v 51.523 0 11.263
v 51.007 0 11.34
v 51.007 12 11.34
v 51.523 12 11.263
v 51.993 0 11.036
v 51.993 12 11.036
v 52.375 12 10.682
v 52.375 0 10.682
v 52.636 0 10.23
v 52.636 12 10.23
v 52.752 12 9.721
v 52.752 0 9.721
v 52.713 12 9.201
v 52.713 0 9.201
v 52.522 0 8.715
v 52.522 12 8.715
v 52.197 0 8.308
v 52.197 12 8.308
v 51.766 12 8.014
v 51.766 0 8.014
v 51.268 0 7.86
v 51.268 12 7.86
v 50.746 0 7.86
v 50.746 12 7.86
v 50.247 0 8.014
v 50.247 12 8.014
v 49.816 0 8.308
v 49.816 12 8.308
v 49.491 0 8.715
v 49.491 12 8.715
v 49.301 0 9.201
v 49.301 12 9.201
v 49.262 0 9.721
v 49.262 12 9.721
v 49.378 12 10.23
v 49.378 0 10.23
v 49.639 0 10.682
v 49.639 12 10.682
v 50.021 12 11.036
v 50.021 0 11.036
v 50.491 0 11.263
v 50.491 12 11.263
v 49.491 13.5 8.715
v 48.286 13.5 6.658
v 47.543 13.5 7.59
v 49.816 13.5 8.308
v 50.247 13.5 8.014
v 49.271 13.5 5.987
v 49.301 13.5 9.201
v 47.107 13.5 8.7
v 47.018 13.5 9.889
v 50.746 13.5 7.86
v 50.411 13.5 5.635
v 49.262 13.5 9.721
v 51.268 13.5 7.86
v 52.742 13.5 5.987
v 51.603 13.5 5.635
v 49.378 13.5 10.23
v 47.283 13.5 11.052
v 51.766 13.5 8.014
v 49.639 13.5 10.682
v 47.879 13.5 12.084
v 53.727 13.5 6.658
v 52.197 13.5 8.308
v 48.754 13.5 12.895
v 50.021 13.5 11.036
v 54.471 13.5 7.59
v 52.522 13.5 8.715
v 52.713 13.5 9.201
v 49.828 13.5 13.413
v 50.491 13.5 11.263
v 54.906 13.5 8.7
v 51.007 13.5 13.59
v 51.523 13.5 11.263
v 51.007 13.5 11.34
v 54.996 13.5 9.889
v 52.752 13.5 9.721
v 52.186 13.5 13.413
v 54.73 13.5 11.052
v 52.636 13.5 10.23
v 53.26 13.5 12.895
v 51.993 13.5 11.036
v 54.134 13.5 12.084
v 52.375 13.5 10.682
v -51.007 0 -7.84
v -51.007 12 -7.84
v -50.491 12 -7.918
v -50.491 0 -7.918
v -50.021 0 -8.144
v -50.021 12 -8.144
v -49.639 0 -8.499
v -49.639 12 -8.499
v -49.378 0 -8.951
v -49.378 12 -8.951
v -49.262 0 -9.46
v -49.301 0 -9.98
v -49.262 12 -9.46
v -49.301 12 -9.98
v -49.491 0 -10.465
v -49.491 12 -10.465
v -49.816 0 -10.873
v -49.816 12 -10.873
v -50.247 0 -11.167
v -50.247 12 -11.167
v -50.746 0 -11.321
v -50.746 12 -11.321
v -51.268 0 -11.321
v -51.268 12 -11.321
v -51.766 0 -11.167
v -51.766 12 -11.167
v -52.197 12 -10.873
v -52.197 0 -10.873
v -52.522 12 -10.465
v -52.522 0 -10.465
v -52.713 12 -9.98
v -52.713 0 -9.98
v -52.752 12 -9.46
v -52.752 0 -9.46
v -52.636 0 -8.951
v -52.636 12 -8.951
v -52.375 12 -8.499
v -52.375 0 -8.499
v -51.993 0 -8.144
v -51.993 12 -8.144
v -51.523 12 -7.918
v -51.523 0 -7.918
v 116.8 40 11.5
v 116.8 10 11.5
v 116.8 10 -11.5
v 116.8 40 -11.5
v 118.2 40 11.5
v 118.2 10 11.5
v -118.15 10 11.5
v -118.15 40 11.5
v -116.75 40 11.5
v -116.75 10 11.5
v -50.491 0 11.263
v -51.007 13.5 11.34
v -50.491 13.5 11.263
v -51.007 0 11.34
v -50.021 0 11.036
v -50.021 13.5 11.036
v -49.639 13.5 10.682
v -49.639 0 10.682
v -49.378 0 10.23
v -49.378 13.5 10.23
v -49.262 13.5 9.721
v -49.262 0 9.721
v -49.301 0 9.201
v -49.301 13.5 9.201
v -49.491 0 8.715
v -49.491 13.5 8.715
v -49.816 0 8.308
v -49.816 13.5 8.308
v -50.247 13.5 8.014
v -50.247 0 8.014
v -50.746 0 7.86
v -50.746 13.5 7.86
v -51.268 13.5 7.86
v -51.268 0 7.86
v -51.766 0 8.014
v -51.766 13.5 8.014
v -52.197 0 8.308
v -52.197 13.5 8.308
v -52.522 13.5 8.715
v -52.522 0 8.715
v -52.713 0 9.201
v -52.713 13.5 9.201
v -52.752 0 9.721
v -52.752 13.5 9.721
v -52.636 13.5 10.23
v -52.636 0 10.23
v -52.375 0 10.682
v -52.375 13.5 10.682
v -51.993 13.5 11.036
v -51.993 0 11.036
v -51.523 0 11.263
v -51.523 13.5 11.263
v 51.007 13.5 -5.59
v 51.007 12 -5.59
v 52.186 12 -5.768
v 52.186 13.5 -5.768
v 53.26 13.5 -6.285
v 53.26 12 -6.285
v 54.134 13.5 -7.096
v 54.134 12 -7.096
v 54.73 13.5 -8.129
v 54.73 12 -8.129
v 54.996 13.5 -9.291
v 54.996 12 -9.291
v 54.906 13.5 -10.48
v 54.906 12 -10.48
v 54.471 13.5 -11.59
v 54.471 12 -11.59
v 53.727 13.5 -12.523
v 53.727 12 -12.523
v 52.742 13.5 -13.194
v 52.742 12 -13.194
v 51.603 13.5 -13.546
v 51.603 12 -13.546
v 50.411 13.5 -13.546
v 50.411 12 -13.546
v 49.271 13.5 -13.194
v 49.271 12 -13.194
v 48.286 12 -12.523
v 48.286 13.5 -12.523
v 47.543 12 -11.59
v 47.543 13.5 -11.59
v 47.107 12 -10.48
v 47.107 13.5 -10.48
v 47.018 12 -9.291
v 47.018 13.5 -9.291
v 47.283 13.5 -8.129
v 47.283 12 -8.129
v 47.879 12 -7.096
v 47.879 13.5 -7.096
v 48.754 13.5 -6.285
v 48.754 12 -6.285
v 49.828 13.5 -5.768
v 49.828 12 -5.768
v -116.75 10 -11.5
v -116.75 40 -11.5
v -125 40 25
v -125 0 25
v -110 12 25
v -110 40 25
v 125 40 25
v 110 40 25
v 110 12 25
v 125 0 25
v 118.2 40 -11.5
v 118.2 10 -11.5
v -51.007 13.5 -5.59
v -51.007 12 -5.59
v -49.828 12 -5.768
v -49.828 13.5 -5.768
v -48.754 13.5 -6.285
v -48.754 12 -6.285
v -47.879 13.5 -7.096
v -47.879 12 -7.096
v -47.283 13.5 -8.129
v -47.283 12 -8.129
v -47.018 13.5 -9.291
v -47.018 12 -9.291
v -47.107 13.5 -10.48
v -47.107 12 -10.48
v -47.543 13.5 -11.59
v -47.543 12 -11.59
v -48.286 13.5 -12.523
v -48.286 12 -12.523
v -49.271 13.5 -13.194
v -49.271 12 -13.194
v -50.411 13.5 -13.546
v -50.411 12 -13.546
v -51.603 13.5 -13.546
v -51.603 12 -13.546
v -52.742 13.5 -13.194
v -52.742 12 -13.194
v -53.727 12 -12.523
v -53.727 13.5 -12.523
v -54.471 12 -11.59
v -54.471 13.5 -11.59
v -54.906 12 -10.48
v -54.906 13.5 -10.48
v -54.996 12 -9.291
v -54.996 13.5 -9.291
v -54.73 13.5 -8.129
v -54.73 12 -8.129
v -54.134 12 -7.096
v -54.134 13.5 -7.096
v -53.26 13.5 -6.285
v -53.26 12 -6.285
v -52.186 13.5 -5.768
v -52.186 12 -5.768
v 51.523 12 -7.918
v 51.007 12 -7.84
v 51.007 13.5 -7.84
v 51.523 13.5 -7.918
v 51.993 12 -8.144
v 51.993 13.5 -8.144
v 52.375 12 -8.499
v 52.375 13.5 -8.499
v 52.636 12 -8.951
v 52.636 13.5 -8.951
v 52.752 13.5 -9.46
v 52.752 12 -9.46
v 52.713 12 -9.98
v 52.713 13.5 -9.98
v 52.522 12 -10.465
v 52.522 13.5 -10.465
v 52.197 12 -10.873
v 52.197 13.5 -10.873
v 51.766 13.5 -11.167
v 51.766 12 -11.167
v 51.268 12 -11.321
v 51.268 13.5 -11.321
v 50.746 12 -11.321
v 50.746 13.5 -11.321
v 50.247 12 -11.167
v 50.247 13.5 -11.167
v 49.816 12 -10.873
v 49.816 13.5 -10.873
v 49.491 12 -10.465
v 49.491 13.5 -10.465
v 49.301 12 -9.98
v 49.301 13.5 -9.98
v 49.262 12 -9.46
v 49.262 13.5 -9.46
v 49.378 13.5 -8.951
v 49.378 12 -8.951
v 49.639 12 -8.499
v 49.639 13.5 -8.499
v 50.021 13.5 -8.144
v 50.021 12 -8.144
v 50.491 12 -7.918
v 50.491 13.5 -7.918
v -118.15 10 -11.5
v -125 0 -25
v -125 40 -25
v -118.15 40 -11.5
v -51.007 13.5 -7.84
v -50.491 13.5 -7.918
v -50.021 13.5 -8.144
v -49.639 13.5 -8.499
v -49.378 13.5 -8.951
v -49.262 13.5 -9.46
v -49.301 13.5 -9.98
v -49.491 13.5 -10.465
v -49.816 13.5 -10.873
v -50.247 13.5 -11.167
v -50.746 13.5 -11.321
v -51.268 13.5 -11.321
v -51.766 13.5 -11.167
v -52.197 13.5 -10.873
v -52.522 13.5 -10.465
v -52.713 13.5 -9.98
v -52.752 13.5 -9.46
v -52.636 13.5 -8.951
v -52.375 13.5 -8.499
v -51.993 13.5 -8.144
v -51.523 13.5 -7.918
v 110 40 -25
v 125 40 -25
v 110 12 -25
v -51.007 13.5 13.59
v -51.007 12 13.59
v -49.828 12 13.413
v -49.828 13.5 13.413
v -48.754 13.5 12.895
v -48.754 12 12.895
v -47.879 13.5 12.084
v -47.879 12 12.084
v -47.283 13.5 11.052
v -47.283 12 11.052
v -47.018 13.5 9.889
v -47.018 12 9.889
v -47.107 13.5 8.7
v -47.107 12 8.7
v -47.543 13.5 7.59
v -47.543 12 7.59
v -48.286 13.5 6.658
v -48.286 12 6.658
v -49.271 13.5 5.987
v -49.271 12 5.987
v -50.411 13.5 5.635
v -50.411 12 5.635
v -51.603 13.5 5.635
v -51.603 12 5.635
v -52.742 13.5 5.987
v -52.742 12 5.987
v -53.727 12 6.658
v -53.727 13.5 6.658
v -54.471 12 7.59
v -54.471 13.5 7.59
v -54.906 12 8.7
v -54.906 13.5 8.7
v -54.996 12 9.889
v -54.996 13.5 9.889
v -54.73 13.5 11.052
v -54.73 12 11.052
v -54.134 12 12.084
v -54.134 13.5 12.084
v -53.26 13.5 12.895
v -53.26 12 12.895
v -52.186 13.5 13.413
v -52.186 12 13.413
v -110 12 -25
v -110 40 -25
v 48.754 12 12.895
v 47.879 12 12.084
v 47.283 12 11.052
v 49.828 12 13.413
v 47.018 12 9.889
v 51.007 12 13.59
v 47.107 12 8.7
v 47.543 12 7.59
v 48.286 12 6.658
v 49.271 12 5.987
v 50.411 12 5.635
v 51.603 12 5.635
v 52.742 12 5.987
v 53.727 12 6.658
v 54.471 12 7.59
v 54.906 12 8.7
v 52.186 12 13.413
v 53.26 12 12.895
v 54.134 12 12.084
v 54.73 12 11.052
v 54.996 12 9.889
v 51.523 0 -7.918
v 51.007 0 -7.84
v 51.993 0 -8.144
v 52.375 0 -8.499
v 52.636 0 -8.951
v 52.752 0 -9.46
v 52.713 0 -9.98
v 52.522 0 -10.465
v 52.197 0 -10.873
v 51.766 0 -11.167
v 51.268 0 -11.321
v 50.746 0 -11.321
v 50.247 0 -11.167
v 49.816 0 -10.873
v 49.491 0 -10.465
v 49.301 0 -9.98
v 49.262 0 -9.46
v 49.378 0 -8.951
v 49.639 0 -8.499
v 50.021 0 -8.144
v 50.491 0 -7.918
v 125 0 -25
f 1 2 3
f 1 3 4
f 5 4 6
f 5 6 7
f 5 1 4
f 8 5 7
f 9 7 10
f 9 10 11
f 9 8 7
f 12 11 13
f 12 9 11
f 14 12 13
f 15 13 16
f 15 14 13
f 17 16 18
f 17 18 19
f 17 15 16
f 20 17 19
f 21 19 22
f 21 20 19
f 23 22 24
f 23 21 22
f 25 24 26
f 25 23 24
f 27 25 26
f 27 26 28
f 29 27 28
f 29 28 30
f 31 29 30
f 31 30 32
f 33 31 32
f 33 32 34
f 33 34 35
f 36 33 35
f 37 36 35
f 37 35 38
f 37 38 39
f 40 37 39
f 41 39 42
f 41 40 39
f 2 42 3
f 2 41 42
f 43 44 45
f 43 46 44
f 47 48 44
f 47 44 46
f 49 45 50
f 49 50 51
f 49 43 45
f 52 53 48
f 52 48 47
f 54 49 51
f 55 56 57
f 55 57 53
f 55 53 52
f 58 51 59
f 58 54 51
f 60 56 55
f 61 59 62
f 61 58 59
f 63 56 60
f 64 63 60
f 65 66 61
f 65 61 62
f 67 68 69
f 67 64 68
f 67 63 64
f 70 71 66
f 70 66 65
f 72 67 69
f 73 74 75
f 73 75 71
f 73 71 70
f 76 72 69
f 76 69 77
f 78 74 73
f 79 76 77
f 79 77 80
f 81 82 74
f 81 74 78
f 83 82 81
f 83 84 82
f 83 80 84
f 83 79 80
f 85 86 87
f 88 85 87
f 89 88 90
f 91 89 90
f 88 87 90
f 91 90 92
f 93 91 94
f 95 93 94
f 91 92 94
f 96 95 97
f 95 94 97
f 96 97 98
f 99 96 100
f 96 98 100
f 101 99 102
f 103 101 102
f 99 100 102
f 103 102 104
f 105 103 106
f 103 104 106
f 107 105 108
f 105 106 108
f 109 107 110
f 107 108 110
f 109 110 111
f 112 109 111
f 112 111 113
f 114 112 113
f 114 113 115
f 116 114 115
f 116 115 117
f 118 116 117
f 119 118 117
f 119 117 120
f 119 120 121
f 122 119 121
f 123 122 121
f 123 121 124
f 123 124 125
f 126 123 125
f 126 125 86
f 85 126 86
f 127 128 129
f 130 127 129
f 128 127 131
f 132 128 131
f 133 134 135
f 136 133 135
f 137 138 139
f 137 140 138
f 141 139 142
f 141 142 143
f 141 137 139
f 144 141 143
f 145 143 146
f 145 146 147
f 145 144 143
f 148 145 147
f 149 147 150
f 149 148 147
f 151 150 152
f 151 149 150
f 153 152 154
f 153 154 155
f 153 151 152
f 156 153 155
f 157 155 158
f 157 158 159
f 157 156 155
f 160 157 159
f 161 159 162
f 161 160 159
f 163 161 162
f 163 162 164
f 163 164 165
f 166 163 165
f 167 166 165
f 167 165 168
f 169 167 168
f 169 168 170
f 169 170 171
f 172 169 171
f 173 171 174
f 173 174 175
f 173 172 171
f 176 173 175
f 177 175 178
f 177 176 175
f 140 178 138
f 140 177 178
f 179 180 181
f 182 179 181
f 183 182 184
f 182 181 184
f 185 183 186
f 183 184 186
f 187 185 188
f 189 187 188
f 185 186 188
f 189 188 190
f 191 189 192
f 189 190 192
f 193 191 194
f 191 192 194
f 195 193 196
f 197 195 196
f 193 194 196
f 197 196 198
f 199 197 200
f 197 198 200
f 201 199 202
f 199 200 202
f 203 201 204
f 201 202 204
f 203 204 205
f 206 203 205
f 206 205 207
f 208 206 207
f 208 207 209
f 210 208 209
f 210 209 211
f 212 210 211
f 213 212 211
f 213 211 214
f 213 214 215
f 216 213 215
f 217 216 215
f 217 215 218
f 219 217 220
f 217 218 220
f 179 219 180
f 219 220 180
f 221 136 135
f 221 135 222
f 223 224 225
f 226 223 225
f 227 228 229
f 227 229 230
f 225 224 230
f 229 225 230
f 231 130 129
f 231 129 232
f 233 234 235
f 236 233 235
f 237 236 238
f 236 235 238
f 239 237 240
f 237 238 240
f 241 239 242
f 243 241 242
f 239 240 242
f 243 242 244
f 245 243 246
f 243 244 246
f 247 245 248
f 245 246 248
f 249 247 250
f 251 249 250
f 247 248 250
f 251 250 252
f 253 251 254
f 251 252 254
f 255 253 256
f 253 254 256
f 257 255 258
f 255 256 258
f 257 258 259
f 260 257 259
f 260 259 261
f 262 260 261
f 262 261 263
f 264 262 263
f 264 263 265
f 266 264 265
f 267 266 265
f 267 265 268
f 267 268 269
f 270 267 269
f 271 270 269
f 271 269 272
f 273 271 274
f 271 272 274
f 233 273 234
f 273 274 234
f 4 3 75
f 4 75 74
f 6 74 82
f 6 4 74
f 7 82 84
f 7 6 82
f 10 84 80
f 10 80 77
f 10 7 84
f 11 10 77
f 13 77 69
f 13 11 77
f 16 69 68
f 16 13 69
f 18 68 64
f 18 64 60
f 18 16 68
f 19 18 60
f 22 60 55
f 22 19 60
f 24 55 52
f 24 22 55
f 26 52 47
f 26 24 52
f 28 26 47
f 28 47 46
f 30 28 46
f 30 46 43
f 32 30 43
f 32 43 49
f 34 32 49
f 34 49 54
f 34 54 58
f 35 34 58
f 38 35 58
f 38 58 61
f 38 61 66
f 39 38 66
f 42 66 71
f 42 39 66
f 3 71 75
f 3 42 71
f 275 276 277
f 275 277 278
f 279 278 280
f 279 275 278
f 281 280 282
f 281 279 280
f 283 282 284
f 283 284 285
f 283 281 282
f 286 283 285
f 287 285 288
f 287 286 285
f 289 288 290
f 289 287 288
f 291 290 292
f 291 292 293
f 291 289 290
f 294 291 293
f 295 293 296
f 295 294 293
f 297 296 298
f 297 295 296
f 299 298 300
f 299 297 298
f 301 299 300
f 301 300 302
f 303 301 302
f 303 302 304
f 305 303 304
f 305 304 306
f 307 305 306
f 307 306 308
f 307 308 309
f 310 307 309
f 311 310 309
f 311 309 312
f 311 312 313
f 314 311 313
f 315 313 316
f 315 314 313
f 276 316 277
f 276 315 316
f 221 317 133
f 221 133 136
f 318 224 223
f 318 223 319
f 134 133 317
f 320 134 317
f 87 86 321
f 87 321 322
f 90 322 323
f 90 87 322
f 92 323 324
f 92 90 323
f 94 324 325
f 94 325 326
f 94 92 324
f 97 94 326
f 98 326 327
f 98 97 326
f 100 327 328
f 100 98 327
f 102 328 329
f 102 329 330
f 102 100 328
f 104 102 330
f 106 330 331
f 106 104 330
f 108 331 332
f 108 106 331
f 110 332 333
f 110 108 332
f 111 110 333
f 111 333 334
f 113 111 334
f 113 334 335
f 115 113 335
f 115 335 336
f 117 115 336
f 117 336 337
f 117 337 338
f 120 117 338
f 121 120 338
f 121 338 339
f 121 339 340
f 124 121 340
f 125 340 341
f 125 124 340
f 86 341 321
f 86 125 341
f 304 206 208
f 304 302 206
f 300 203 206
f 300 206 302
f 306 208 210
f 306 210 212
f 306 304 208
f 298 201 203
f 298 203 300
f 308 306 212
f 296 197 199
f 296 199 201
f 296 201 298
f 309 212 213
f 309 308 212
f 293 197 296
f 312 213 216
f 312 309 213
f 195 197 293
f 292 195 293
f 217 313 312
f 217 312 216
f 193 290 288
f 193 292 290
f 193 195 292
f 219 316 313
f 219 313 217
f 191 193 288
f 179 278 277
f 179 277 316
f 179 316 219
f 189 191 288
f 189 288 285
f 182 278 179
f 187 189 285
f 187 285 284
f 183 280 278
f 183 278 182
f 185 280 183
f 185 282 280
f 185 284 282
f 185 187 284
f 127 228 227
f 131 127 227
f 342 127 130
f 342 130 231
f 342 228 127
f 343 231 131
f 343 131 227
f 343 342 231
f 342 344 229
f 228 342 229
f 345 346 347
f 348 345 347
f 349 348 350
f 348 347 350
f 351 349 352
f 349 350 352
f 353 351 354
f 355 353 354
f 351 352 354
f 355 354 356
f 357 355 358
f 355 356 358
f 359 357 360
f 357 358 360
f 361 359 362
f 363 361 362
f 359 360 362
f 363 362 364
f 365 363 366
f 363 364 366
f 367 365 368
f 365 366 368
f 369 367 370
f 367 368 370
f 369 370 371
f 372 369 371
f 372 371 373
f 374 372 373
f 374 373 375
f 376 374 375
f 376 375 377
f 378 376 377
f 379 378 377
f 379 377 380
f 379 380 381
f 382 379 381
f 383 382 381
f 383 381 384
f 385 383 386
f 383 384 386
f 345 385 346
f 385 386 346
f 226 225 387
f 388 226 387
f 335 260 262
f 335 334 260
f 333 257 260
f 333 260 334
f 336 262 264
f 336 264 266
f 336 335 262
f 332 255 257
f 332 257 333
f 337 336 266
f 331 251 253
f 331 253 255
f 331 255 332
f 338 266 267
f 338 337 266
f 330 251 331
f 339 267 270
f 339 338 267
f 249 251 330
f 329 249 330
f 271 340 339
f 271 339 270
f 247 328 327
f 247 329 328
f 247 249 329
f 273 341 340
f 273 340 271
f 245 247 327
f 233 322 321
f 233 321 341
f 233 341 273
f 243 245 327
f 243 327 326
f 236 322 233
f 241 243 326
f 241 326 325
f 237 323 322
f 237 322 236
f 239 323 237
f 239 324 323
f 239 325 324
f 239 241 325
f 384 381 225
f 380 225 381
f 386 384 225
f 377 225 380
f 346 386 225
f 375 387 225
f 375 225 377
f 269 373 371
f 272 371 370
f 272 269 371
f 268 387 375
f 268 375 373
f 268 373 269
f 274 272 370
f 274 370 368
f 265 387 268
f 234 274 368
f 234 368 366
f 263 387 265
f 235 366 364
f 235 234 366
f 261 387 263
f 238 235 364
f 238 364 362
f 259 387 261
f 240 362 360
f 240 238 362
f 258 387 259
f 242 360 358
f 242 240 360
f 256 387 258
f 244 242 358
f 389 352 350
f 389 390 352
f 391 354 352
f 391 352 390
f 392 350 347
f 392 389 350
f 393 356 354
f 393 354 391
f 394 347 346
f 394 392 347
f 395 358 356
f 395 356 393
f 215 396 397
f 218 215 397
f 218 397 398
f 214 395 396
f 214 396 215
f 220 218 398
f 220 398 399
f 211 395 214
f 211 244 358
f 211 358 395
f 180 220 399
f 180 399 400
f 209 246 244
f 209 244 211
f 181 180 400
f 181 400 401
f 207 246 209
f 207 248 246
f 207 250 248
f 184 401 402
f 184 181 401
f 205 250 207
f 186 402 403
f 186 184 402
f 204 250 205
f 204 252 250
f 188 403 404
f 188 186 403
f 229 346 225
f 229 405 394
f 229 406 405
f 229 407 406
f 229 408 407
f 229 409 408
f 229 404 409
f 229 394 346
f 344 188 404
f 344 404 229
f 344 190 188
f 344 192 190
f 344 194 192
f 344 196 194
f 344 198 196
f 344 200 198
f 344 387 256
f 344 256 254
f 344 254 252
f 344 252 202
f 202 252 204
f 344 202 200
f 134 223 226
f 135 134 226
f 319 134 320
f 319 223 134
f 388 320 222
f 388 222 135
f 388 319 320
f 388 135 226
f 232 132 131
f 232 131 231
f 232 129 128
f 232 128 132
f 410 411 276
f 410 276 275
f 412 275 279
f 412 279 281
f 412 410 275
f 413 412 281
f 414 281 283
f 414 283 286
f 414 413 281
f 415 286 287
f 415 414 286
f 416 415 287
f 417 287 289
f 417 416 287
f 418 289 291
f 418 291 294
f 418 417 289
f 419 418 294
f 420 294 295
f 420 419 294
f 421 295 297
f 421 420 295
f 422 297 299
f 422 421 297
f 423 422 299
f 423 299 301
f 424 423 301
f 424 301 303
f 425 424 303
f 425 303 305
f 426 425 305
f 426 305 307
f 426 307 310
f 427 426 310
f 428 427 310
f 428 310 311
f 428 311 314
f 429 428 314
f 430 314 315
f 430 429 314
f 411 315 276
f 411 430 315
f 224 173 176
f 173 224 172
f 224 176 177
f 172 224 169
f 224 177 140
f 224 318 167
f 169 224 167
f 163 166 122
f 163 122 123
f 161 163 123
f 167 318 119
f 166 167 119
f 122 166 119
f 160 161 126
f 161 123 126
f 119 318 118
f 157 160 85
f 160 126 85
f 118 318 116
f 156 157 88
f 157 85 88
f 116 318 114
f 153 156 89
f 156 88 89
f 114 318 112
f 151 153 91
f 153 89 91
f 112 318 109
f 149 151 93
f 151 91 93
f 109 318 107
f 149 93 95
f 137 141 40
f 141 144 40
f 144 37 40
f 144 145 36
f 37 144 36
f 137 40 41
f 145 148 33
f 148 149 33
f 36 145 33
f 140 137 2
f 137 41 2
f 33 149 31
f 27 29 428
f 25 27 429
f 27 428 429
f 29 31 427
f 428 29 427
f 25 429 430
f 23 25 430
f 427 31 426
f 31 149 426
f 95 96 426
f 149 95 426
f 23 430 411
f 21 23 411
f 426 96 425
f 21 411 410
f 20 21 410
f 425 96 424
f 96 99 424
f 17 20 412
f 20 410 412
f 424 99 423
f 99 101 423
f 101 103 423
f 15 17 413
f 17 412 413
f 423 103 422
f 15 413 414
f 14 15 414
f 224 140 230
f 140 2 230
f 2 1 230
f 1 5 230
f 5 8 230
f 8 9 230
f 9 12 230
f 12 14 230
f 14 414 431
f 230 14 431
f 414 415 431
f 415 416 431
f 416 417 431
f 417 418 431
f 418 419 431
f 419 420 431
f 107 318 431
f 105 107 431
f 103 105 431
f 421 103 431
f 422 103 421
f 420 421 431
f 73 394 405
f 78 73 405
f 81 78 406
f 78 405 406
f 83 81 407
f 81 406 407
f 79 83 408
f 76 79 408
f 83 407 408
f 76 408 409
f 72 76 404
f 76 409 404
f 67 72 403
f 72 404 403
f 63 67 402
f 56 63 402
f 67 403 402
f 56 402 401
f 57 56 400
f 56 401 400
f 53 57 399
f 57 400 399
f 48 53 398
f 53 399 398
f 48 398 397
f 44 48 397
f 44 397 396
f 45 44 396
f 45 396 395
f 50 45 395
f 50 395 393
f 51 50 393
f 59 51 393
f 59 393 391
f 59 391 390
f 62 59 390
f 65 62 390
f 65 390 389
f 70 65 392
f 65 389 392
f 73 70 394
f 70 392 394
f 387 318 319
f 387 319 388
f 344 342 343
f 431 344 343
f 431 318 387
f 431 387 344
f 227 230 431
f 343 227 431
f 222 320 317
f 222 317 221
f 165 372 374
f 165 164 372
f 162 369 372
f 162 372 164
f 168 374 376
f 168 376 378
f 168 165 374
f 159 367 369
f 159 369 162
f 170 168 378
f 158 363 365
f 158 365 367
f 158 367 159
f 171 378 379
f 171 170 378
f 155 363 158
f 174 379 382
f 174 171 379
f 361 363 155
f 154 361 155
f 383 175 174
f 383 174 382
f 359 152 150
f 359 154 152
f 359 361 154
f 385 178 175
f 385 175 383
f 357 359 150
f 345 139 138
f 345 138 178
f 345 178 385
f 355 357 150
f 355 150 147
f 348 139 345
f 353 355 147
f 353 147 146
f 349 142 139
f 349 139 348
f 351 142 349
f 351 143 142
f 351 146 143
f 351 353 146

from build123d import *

# Parameters (mm, degrees)
SKETCH1_W           = 15
SKETCH1_H           = 50
BOSS_EXTRUDE1_DEPTH = 40
BOSS_EXTRUDE2_DEPTH = 40
SKETCH1_6_R         = 1.75
BOSS_EXTRUDE3_DEPTH = 12
SKETCH2_W           = 1.4
SKETCH2_H           = 23
CUT_EXTRUDE1_DEPTH  = 30
SKETCH3_W           = 1.4
SKETCH3_H           = 23
CUT_EXTRUDE2_DEPTH  = 30
SKETCH4_R           = 1.75
CUT_EXTRUDE5_DEPTH  = 25
SKETCH5_R           = 4
SKETCH5_R_2         = 1.75
BOSS_EXTRUDE4_DEPTH = 1.5
SKETCH6_R           = 4
SKETCH6_R_2         = 1.75
BOSS_EXTRUDE5_DEPTH = 1.5


with BuildPart() as part:
    # Sketch1 → Boss-Extrude1 (new body)
    with BuildSketch(Plane(origin=(0, 0, 0), x_dir=(1, 0, 0), z_dir=(0, 1, 0))):
        with Locations((-117.5, 0)):
            Rectangle(SKETCH1_W, SKETCH1_H)
    extrude(amount=BOSS_EXTRUDE1_DEPTH)



with BuildPart() as body_2:
    # Sketch1<4> → Boss-Extrude2 (new body)
    with BuildSketch(Plane(origin=(0, 0, 0), x_dir=(1, 0, 0), z_dir=(0, 1, 0))):
        Polygon((125, 25), (110, 25), (110, 0), (110, -25), (125, -25), align=None)
    extrude(amount=BOSS_EXTRUDE2_DEPTH)


with BuildPart() as part_1:
    add(part.part)

    add(body_2.part)  # Boss-Extrude3 merges body 2
    # Sketch1<6> → Boss-Extrude3 (add)
    with BuildSketch(Plane(origin=(0, 0, 0), x_dir=(1, 0, 0), z_dir=(0, 1, 0))):
        Polygon((110, 25), (-110, 25), (-110, -25), (110, -25), (110, 0), align=None)
        with Locations((-51.006782466, -9.590411403)):
            Circle(SKETCH1_6_R, mode=Mode.SUBTRACT)
        with Locations((51.006782466, -9.590411403)):
            Circle(SKETCH1_6_R, mode=Mode.SUBTRACT)
        with Locations((51.006782466, 9.590411403)):
            Circle(SKETCH1_6_R, mode=Mode.SUBTRACT)
    extrude(amount=BOSS_EXTRUDE3_DEPTH)

    # Sketch2 → Cut-Extrude1 (cut)
    with BuildSketch(Plane(origin=(0, 40, 0), x_dir=(1, 0, 0), z_dir=(0, 1, 0))):
        with Locations((-117.45, 0)):
            Rectangle(SKETCH2_W, SKETCH2_H)
    extrude(amount=-CUT_EXTRUDE1_DEPTH, mode=Mode.SUBTRACT)

    # Sketch3 → Cut-Extrude2 (cut)
    with BuildSketch(Plane(origin=(0, 40, 0), x_dir=(1, 0, 0), z_dir=(0, 1, 0))):
        with Locations((117.5, 0)):
            Rectangle(SKETCH3_W, SKETCH3_H)
    extrude(amount=-CUT_EXTRUDE2_DEPTH, mode=Mode.SUBTRACT)

    # Sketch4 → Cut-Extrude5 (cut)
    with BuildSketch(Plane(origin=(0, 12, 0), x_dir=(1, 0, 0), z_dir=(0, 1, 0))):
        with Locations((-51.006782466, 9.590411403)):
            Circle(SKETCH4_R)
    extrude(amount=-CUT_EXTRUDE5_DEPTH, mode=Mode.SUBTRACT)

    # Sketch5 → Boss-Extrude4 (add)
    with BuildSketch(Plane(origin=(0, 12, 0), x_dir=(1, 0, 0), z_dir=(0, 1, 0))):
        with Locations((-51.006782466, -9.590411403)):
            Circle(SKETCH5_R)
        with Locations((-51.006782466, -9.590411403)):
            Circle(SKETCH5_R_2, mode=Mode.SUBTRACT)
    extrude(amount=BOSS_EXTRUDE4_DEPTH)

    # Sketch6 → Boss-Extrude5 (add)
    # profile 1 of 3: a face of its own
    with BuildSketch(Plane(origin=(0, 12, 0), x_dir=(1, 0, 0), z_dir=(0, 1, 0))):
        with Locations((-51.006782466, 9.590411403)):
            Circle(SKETCH6_R)
        with Locations((-51.006782466, 9.590411403)):
            Circle(SKETCH6_R_2, mode=Mode.SUBTRACT)
    # profile 2 of 3: a face of its own
    with BuildSketch(Plane(origin=(0, 12, 0), x_dir=(1, 0, 0), z_dir=(0, 1, 0))):
        with Locations((51.006782466, 9.590411403)):
            Circle(SKETCH6_R)
        with Locations((51.006782466, 9.590411403)):
            Circle(SKETCH6_R_2, mode=Mode.SUBTRACT)
    # profile 3 of 3: a face of its own
    with BuildSketch(Plane(origin=(0, 12, 0), x_dir=(1, 0, 0), z_dir=(0, 1, 0))):
        with Locations((51.006782466, -9.590411403)):
            Circle(SKETCH6_R)
        with Locations((51.006782466, -9.590411403)):
            Circle(SKETCH6_R_2, mode=Mode.SUBTRACT)
    extrude(amount=BOSS_EXTRUDE5_DEPTH)


solid = part_1.part
